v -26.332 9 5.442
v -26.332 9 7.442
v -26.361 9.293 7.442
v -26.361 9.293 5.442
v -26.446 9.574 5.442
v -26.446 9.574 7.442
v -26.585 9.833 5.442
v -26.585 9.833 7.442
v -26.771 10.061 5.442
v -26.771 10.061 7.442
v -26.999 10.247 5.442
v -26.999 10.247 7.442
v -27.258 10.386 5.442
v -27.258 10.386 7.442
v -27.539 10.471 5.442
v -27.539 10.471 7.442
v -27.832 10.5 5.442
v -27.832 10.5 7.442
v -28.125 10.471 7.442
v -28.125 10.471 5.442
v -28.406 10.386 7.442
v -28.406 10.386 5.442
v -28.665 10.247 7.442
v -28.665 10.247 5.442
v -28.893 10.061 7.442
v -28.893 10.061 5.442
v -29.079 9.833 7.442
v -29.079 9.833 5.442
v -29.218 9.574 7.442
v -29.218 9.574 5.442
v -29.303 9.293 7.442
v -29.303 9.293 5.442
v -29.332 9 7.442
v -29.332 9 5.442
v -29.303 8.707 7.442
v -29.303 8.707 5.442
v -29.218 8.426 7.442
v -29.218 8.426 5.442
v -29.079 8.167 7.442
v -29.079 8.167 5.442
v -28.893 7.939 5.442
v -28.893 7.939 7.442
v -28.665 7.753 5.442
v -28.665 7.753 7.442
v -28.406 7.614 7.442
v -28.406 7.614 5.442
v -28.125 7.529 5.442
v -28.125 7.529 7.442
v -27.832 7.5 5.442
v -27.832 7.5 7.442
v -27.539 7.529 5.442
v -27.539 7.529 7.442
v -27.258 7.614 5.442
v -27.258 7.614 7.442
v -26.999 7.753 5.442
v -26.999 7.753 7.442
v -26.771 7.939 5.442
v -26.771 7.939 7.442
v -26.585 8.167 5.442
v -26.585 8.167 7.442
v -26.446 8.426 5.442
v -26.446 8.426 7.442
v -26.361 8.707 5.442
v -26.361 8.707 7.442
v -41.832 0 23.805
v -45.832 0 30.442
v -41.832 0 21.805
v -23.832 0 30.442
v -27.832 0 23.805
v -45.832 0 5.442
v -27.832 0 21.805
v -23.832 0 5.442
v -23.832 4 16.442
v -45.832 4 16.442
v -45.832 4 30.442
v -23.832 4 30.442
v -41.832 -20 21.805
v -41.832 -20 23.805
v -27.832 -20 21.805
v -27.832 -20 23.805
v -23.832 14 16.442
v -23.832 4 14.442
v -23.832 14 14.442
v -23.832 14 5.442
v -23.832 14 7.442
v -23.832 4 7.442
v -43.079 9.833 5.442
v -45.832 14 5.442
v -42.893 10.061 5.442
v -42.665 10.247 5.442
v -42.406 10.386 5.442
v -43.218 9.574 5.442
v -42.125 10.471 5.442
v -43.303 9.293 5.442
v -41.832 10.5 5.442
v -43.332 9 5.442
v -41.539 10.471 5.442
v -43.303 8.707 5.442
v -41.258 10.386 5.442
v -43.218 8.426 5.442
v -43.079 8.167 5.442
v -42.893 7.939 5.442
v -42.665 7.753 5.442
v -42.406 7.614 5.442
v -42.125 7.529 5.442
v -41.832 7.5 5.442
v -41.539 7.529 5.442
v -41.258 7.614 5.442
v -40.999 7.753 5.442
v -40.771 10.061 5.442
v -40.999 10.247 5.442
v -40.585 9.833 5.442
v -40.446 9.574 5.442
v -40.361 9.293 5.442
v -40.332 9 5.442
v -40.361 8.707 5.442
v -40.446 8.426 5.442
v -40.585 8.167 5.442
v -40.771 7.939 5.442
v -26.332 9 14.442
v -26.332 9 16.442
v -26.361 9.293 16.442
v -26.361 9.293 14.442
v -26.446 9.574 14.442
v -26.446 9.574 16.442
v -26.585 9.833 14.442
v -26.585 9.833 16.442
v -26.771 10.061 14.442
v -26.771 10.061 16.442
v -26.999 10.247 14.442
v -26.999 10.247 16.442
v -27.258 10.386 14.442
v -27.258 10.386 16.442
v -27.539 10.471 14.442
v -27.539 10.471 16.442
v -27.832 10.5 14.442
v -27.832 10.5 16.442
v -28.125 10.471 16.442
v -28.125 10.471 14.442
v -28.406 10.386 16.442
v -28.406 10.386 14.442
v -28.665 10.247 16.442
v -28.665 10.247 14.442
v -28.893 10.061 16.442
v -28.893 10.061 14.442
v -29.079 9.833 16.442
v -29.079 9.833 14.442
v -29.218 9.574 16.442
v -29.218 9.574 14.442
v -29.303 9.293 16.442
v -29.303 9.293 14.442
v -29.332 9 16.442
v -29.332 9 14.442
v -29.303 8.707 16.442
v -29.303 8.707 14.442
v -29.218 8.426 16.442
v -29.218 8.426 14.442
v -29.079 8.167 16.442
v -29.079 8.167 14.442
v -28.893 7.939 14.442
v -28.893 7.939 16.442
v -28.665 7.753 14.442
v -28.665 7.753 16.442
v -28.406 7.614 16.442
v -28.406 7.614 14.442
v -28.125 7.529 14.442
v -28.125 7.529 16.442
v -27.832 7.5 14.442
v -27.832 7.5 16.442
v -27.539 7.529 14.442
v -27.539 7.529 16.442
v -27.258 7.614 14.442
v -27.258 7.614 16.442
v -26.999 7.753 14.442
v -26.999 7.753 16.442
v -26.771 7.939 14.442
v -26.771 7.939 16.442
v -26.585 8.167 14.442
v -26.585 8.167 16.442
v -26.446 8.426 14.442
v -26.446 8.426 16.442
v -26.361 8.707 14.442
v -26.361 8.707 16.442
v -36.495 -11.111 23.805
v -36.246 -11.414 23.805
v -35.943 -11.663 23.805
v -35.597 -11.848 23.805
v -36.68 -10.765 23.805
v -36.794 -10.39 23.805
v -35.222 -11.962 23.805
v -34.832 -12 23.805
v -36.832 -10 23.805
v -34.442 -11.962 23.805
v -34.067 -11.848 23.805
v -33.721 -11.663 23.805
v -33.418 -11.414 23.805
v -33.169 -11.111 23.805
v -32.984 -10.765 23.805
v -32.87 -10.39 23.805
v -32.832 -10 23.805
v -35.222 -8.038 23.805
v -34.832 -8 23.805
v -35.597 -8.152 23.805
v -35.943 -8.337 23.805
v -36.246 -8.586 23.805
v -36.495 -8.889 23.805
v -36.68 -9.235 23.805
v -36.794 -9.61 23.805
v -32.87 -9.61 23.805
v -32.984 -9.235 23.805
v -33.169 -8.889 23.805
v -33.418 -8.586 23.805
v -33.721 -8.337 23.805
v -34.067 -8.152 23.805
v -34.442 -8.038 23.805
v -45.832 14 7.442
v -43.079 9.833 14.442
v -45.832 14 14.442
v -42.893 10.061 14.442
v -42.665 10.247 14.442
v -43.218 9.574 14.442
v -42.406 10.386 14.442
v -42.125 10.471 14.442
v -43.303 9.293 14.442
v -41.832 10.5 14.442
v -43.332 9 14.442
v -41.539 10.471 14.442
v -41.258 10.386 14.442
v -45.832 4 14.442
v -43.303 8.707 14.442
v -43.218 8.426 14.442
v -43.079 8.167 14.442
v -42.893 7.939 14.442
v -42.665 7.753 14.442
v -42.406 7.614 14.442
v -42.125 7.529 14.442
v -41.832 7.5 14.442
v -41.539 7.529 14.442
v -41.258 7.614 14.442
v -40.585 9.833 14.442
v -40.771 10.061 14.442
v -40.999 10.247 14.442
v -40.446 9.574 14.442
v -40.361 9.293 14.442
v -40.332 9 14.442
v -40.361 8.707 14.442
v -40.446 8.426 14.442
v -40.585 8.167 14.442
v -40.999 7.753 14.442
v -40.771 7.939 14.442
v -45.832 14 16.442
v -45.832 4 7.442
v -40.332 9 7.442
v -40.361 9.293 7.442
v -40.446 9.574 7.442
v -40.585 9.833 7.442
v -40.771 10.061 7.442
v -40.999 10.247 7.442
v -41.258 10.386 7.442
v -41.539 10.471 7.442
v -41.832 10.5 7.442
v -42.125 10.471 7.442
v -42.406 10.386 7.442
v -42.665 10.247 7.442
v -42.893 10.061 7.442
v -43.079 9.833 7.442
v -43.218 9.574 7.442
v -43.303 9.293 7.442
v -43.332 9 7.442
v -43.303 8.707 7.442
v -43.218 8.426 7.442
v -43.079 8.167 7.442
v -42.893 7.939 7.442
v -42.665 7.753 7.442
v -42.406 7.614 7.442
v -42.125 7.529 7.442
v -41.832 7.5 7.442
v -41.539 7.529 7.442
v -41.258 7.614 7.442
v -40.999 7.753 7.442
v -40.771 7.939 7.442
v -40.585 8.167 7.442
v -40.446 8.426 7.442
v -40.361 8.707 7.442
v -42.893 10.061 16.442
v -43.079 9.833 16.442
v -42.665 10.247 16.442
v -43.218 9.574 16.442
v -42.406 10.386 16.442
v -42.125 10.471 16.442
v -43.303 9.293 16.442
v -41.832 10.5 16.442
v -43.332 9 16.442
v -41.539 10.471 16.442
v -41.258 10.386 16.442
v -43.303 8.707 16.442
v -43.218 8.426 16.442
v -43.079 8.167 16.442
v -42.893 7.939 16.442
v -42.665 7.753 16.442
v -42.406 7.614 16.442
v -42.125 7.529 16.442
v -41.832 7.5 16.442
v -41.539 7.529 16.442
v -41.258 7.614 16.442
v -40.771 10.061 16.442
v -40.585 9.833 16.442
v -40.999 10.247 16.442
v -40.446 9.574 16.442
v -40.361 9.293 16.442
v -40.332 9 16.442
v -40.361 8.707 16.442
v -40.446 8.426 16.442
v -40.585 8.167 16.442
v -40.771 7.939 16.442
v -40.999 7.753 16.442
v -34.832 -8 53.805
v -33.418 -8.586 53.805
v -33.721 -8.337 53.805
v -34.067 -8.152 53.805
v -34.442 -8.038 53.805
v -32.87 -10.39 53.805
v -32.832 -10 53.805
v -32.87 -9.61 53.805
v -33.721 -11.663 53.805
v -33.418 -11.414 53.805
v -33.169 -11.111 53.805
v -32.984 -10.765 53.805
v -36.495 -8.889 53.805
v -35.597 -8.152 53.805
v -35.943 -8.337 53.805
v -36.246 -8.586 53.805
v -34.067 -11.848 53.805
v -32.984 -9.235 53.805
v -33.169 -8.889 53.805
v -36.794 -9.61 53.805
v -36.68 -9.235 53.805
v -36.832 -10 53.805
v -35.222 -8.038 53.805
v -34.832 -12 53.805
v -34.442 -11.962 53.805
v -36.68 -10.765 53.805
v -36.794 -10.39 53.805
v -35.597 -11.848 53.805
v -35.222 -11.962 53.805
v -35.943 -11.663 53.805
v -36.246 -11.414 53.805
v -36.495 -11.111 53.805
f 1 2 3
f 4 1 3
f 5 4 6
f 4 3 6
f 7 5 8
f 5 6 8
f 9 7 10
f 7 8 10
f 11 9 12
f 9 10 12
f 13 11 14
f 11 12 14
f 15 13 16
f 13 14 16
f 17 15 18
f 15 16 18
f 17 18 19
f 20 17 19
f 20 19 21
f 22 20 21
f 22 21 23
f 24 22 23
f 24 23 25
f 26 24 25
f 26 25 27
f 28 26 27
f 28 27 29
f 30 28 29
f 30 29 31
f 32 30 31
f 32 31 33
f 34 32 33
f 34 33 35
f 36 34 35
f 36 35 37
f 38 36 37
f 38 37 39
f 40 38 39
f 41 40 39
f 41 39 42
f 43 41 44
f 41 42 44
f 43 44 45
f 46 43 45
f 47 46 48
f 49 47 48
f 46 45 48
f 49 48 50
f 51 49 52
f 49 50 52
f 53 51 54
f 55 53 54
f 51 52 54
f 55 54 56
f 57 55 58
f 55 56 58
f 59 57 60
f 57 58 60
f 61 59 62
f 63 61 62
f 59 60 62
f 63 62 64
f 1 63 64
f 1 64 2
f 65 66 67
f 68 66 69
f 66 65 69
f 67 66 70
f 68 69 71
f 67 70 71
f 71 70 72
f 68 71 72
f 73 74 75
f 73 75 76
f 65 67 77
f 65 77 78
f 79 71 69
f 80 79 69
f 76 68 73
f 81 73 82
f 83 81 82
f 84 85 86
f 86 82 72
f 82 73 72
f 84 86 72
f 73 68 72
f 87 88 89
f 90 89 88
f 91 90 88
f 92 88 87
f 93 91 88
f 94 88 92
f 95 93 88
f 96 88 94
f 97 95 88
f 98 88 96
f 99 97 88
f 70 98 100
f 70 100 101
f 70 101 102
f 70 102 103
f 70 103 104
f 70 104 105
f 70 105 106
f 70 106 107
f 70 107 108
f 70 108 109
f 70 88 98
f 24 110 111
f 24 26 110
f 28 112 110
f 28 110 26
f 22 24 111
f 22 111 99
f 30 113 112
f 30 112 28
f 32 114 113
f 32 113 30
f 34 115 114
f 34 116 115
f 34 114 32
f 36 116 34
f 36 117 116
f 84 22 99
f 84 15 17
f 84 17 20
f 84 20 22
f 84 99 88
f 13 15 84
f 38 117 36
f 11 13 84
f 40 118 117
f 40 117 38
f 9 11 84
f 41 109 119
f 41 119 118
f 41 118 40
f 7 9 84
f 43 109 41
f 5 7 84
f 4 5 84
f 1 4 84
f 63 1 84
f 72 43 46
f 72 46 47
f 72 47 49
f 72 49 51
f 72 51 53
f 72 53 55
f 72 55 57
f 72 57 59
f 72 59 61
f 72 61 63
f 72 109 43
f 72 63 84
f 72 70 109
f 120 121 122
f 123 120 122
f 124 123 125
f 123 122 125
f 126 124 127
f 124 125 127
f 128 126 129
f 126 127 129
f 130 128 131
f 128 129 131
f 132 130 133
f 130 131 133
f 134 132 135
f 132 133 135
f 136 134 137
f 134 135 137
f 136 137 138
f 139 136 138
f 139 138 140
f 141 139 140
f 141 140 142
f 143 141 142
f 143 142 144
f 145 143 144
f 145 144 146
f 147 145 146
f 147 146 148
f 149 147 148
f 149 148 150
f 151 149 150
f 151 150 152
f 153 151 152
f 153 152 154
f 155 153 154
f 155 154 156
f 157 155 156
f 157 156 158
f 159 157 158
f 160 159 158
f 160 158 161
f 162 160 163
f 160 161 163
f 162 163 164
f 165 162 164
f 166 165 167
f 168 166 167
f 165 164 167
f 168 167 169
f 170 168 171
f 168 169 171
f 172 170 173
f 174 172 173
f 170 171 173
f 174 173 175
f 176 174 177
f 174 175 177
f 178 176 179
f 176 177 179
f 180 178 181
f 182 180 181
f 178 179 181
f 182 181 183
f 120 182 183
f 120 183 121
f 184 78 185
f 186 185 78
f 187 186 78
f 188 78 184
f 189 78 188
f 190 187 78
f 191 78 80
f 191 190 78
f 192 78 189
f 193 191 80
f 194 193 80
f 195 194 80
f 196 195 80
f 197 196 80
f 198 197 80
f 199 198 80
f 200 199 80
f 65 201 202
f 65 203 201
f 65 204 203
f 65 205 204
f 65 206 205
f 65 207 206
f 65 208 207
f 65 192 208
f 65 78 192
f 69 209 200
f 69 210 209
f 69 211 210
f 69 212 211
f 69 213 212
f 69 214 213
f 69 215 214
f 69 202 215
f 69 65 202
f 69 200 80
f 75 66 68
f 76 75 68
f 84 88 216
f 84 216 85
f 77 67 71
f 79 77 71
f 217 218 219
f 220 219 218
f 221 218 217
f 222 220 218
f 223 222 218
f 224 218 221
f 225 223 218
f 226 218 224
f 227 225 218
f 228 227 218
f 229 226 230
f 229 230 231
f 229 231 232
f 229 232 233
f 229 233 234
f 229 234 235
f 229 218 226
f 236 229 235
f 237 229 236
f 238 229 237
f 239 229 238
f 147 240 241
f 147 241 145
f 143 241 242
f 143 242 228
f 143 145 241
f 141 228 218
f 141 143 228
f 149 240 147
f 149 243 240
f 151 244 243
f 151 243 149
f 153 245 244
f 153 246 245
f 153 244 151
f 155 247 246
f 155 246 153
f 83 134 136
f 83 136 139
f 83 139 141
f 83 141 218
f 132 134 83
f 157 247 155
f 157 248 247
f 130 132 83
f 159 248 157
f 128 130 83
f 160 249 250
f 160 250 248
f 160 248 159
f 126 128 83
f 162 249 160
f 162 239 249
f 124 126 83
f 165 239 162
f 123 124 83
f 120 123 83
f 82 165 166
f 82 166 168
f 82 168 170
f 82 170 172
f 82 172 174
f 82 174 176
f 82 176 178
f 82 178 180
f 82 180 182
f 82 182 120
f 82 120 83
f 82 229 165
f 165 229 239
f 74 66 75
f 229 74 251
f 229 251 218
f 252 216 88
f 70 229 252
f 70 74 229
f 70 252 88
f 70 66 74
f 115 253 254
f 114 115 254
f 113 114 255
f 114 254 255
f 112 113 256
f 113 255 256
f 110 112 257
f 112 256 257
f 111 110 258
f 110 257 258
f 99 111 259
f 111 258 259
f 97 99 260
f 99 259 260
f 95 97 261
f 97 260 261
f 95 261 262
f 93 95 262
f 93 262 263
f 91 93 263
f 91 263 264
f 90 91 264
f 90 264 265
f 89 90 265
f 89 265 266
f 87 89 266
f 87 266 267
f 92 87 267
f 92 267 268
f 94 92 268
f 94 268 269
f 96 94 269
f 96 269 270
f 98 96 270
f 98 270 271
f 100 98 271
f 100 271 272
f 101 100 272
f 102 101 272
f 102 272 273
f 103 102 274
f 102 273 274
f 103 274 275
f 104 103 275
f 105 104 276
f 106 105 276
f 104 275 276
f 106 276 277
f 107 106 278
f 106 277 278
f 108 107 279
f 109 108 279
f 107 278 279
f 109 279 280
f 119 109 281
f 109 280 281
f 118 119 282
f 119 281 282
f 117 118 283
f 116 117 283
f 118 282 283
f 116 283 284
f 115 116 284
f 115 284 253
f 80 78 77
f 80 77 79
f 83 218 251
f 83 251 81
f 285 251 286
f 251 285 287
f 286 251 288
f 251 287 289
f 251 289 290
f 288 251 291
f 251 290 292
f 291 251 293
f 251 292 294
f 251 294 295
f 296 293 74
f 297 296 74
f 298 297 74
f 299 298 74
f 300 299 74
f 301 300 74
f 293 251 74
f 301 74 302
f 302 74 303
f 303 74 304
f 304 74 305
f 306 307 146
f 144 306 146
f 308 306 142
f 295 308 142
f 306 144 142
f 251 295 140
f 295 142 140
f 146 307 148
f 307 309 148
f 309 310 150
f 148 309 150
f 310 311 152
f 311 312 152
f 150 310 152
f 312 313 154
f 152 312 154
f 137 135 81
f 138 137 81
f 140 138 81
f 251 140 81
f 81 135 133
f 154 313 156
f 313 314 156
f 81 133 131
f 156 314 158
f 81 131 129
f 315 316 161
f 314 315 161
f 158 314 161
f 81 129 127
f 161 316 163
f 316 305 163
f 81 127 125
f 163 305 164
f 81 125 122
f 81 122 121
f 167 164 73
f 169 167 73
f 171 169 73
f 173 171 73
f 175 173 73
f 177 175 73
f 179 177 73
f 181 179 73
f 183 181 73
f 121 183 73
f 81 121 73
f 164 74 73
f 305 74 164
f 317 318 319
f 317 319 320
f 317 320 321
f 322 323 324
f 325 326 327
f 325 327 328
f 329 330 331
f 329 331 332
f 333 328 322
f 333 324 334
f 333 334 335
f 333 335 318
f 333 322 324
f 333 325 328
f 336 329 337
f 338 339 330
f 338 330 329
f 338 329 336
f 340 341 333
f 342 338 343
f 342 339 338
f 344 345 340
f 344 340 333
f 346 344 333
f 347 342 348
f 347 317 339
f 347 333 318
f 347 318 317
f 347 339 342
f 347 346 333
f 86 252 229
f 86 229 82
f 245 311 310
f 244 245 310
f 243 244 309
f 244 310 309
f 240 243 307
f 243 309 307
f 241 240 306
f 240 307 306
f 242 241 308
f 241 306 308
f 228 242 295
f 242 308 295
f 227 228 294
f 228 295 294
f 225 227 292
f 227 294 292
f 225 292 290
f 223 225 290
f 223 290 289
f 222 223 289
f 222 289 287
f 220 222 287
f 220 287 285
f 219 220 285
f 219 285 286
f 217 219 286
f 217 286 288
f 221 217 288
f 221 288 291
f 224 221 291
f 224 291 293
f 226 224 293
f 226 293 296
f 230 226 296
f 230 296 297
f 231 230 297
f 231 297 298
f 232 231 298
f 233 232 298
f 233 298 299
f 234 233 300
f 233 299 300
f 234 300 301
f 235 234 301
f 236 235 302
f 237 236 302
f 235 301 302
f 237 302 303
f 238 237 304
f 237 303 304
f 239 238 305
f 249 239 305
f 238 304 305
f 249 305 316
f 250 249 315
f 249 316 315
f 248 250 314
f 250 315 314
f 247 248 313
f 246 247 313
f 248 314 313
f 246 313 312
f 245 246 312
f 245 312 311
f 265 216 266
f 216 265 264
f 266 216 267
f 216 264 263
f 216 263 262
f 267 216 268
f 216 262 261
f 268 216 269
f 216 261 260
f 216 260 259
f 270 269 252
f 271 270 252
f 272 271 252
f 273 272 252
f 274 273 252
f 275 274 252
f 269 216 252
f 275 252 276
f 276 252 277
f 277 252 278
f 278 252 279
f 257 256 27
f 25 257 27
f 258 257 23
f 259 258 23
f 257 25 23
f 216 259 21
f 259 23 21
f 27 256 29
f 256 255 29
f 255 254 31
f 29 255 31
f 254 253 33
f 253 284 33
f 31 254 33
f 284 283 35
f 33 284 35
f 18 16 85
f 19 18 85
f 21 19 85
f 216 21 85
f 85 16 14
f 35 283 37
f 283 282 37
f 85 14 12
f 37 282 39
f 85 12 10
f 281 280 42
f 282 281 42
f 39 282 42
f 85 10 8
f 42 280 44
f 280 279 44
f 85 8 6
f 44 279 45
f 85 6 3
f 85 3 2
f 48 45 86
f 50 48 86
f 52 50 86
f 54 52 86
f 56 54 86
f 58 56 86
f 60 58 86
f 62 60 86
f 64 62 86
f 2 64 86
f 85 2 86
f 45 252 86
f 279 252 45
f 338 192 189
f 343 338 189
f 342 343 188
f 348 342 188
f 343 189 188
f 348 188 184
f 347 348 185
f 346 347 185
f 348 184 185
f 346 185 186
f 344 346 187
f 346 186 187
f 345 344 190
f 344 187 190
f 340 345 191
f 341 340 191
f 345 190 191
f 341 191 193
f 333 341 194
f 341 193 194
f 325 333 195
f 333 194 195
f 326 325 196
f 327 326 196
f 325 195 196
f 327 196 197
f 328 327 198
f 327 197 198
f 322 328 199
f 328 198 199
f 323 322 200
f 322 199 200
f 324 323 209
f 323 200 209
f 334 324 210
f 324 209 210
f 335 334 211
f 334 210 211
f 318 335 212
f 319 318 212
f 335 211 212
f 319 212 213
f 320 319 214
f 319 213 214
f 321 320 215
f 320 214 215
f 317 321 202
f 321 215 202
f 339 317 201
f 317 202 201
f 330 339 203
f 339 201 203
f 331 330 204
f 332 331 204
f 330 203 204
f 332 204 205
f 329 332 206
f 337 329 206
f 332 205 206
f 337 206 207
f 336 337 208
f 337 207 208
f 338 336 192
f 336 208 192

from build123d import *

# Parameters (mm, degrees)
SKETCH_2_W          = 22
SKETCH_2_H          = 25
EXTRUDE_1_DEPTH     = 4
SKETCH_3_W          = 22
SKETCH_3_H          = 2
EXTRUDE_2_DEPTH     = 10
SKETCH_4_R          = 1.5
CUT_EXTRUDE_1_DEPTH = 11
SKETCH_5_W          = 14
SKETCH_5_H          = 2
EXTRUDE_3_DEPTH     = 20
SKETCH_6_R          = 2
EXTRUDE_4_DEPTH     = 30


with BuildPart() as part:
    # Эскиз2 → Бобышка-Вытянуть1 (new body)
    with BuildSketch(Plane(origin=(0, 0, 0), x_dir=(1, 0, 0), z_dir=(0, 1, 0))):
        with Locations((-34.831985697, -17.94161698)):
            Rectangle(SKETCH_2_W, SKETCH_2_H)
    extrude(amount=EXTRUDE_1_DEPTH)

    # Эскиз3 → Бобышка-Вытянуть2 (add)
    with BuildSketch(Plane(origin=(0, 4, 0), x_dir=(1, 0, 0), z_dir=(0, 1, 0))):
        with Locations((-34.831985697, -6.44161698)):
            Rectangle(SKETCH_3_W, SKETCH_3_H)
        with Locations((-34.831985697, -15.44161698)):
            Rectangle(SKETCH_3_W, SKETCH_3_H)
    extrude(amount=EXTRUDE_2_DEPTH)

    # Эскиз4 → Вырез-Вытянуть1 (cut)
    with BuildSketch(Plane.XY.offset(16.44161698)):
        with Locations((-41.831985697, 9)):
            Circle(SKETCH_4_R)
        with Locations((-27.831985697, 9)):
            Circle(SKETCH_4_R)
    extrude(amount=-CUT_EXTRUDE_1_DEPTH, mode=Mode.SUBTRACT)

    # Эскиз5 → Бобышка-Вытянуть3 (add)
    with BuildSketch(Plane.XZ):
        with Locations((-34.831985697, 22.805333719)):
            Rectangle(SKETCH_5_W, SKETCH_5_H)
    extrude(amount=EXTRUDE_3_DEPTH)

    # Эскиз6 → Бобышка-Вытянуть4 (add)
    with BuildSketch(Plane.XY.offset(23.805333719)):
        with Locations(Location((-34.831985697, -10, 0), (0, 0, 180))):
            Circle(SKETCH_6_R)
    extrude(amount=EXTRUDE_4_DEPTH)


solid = part.part
